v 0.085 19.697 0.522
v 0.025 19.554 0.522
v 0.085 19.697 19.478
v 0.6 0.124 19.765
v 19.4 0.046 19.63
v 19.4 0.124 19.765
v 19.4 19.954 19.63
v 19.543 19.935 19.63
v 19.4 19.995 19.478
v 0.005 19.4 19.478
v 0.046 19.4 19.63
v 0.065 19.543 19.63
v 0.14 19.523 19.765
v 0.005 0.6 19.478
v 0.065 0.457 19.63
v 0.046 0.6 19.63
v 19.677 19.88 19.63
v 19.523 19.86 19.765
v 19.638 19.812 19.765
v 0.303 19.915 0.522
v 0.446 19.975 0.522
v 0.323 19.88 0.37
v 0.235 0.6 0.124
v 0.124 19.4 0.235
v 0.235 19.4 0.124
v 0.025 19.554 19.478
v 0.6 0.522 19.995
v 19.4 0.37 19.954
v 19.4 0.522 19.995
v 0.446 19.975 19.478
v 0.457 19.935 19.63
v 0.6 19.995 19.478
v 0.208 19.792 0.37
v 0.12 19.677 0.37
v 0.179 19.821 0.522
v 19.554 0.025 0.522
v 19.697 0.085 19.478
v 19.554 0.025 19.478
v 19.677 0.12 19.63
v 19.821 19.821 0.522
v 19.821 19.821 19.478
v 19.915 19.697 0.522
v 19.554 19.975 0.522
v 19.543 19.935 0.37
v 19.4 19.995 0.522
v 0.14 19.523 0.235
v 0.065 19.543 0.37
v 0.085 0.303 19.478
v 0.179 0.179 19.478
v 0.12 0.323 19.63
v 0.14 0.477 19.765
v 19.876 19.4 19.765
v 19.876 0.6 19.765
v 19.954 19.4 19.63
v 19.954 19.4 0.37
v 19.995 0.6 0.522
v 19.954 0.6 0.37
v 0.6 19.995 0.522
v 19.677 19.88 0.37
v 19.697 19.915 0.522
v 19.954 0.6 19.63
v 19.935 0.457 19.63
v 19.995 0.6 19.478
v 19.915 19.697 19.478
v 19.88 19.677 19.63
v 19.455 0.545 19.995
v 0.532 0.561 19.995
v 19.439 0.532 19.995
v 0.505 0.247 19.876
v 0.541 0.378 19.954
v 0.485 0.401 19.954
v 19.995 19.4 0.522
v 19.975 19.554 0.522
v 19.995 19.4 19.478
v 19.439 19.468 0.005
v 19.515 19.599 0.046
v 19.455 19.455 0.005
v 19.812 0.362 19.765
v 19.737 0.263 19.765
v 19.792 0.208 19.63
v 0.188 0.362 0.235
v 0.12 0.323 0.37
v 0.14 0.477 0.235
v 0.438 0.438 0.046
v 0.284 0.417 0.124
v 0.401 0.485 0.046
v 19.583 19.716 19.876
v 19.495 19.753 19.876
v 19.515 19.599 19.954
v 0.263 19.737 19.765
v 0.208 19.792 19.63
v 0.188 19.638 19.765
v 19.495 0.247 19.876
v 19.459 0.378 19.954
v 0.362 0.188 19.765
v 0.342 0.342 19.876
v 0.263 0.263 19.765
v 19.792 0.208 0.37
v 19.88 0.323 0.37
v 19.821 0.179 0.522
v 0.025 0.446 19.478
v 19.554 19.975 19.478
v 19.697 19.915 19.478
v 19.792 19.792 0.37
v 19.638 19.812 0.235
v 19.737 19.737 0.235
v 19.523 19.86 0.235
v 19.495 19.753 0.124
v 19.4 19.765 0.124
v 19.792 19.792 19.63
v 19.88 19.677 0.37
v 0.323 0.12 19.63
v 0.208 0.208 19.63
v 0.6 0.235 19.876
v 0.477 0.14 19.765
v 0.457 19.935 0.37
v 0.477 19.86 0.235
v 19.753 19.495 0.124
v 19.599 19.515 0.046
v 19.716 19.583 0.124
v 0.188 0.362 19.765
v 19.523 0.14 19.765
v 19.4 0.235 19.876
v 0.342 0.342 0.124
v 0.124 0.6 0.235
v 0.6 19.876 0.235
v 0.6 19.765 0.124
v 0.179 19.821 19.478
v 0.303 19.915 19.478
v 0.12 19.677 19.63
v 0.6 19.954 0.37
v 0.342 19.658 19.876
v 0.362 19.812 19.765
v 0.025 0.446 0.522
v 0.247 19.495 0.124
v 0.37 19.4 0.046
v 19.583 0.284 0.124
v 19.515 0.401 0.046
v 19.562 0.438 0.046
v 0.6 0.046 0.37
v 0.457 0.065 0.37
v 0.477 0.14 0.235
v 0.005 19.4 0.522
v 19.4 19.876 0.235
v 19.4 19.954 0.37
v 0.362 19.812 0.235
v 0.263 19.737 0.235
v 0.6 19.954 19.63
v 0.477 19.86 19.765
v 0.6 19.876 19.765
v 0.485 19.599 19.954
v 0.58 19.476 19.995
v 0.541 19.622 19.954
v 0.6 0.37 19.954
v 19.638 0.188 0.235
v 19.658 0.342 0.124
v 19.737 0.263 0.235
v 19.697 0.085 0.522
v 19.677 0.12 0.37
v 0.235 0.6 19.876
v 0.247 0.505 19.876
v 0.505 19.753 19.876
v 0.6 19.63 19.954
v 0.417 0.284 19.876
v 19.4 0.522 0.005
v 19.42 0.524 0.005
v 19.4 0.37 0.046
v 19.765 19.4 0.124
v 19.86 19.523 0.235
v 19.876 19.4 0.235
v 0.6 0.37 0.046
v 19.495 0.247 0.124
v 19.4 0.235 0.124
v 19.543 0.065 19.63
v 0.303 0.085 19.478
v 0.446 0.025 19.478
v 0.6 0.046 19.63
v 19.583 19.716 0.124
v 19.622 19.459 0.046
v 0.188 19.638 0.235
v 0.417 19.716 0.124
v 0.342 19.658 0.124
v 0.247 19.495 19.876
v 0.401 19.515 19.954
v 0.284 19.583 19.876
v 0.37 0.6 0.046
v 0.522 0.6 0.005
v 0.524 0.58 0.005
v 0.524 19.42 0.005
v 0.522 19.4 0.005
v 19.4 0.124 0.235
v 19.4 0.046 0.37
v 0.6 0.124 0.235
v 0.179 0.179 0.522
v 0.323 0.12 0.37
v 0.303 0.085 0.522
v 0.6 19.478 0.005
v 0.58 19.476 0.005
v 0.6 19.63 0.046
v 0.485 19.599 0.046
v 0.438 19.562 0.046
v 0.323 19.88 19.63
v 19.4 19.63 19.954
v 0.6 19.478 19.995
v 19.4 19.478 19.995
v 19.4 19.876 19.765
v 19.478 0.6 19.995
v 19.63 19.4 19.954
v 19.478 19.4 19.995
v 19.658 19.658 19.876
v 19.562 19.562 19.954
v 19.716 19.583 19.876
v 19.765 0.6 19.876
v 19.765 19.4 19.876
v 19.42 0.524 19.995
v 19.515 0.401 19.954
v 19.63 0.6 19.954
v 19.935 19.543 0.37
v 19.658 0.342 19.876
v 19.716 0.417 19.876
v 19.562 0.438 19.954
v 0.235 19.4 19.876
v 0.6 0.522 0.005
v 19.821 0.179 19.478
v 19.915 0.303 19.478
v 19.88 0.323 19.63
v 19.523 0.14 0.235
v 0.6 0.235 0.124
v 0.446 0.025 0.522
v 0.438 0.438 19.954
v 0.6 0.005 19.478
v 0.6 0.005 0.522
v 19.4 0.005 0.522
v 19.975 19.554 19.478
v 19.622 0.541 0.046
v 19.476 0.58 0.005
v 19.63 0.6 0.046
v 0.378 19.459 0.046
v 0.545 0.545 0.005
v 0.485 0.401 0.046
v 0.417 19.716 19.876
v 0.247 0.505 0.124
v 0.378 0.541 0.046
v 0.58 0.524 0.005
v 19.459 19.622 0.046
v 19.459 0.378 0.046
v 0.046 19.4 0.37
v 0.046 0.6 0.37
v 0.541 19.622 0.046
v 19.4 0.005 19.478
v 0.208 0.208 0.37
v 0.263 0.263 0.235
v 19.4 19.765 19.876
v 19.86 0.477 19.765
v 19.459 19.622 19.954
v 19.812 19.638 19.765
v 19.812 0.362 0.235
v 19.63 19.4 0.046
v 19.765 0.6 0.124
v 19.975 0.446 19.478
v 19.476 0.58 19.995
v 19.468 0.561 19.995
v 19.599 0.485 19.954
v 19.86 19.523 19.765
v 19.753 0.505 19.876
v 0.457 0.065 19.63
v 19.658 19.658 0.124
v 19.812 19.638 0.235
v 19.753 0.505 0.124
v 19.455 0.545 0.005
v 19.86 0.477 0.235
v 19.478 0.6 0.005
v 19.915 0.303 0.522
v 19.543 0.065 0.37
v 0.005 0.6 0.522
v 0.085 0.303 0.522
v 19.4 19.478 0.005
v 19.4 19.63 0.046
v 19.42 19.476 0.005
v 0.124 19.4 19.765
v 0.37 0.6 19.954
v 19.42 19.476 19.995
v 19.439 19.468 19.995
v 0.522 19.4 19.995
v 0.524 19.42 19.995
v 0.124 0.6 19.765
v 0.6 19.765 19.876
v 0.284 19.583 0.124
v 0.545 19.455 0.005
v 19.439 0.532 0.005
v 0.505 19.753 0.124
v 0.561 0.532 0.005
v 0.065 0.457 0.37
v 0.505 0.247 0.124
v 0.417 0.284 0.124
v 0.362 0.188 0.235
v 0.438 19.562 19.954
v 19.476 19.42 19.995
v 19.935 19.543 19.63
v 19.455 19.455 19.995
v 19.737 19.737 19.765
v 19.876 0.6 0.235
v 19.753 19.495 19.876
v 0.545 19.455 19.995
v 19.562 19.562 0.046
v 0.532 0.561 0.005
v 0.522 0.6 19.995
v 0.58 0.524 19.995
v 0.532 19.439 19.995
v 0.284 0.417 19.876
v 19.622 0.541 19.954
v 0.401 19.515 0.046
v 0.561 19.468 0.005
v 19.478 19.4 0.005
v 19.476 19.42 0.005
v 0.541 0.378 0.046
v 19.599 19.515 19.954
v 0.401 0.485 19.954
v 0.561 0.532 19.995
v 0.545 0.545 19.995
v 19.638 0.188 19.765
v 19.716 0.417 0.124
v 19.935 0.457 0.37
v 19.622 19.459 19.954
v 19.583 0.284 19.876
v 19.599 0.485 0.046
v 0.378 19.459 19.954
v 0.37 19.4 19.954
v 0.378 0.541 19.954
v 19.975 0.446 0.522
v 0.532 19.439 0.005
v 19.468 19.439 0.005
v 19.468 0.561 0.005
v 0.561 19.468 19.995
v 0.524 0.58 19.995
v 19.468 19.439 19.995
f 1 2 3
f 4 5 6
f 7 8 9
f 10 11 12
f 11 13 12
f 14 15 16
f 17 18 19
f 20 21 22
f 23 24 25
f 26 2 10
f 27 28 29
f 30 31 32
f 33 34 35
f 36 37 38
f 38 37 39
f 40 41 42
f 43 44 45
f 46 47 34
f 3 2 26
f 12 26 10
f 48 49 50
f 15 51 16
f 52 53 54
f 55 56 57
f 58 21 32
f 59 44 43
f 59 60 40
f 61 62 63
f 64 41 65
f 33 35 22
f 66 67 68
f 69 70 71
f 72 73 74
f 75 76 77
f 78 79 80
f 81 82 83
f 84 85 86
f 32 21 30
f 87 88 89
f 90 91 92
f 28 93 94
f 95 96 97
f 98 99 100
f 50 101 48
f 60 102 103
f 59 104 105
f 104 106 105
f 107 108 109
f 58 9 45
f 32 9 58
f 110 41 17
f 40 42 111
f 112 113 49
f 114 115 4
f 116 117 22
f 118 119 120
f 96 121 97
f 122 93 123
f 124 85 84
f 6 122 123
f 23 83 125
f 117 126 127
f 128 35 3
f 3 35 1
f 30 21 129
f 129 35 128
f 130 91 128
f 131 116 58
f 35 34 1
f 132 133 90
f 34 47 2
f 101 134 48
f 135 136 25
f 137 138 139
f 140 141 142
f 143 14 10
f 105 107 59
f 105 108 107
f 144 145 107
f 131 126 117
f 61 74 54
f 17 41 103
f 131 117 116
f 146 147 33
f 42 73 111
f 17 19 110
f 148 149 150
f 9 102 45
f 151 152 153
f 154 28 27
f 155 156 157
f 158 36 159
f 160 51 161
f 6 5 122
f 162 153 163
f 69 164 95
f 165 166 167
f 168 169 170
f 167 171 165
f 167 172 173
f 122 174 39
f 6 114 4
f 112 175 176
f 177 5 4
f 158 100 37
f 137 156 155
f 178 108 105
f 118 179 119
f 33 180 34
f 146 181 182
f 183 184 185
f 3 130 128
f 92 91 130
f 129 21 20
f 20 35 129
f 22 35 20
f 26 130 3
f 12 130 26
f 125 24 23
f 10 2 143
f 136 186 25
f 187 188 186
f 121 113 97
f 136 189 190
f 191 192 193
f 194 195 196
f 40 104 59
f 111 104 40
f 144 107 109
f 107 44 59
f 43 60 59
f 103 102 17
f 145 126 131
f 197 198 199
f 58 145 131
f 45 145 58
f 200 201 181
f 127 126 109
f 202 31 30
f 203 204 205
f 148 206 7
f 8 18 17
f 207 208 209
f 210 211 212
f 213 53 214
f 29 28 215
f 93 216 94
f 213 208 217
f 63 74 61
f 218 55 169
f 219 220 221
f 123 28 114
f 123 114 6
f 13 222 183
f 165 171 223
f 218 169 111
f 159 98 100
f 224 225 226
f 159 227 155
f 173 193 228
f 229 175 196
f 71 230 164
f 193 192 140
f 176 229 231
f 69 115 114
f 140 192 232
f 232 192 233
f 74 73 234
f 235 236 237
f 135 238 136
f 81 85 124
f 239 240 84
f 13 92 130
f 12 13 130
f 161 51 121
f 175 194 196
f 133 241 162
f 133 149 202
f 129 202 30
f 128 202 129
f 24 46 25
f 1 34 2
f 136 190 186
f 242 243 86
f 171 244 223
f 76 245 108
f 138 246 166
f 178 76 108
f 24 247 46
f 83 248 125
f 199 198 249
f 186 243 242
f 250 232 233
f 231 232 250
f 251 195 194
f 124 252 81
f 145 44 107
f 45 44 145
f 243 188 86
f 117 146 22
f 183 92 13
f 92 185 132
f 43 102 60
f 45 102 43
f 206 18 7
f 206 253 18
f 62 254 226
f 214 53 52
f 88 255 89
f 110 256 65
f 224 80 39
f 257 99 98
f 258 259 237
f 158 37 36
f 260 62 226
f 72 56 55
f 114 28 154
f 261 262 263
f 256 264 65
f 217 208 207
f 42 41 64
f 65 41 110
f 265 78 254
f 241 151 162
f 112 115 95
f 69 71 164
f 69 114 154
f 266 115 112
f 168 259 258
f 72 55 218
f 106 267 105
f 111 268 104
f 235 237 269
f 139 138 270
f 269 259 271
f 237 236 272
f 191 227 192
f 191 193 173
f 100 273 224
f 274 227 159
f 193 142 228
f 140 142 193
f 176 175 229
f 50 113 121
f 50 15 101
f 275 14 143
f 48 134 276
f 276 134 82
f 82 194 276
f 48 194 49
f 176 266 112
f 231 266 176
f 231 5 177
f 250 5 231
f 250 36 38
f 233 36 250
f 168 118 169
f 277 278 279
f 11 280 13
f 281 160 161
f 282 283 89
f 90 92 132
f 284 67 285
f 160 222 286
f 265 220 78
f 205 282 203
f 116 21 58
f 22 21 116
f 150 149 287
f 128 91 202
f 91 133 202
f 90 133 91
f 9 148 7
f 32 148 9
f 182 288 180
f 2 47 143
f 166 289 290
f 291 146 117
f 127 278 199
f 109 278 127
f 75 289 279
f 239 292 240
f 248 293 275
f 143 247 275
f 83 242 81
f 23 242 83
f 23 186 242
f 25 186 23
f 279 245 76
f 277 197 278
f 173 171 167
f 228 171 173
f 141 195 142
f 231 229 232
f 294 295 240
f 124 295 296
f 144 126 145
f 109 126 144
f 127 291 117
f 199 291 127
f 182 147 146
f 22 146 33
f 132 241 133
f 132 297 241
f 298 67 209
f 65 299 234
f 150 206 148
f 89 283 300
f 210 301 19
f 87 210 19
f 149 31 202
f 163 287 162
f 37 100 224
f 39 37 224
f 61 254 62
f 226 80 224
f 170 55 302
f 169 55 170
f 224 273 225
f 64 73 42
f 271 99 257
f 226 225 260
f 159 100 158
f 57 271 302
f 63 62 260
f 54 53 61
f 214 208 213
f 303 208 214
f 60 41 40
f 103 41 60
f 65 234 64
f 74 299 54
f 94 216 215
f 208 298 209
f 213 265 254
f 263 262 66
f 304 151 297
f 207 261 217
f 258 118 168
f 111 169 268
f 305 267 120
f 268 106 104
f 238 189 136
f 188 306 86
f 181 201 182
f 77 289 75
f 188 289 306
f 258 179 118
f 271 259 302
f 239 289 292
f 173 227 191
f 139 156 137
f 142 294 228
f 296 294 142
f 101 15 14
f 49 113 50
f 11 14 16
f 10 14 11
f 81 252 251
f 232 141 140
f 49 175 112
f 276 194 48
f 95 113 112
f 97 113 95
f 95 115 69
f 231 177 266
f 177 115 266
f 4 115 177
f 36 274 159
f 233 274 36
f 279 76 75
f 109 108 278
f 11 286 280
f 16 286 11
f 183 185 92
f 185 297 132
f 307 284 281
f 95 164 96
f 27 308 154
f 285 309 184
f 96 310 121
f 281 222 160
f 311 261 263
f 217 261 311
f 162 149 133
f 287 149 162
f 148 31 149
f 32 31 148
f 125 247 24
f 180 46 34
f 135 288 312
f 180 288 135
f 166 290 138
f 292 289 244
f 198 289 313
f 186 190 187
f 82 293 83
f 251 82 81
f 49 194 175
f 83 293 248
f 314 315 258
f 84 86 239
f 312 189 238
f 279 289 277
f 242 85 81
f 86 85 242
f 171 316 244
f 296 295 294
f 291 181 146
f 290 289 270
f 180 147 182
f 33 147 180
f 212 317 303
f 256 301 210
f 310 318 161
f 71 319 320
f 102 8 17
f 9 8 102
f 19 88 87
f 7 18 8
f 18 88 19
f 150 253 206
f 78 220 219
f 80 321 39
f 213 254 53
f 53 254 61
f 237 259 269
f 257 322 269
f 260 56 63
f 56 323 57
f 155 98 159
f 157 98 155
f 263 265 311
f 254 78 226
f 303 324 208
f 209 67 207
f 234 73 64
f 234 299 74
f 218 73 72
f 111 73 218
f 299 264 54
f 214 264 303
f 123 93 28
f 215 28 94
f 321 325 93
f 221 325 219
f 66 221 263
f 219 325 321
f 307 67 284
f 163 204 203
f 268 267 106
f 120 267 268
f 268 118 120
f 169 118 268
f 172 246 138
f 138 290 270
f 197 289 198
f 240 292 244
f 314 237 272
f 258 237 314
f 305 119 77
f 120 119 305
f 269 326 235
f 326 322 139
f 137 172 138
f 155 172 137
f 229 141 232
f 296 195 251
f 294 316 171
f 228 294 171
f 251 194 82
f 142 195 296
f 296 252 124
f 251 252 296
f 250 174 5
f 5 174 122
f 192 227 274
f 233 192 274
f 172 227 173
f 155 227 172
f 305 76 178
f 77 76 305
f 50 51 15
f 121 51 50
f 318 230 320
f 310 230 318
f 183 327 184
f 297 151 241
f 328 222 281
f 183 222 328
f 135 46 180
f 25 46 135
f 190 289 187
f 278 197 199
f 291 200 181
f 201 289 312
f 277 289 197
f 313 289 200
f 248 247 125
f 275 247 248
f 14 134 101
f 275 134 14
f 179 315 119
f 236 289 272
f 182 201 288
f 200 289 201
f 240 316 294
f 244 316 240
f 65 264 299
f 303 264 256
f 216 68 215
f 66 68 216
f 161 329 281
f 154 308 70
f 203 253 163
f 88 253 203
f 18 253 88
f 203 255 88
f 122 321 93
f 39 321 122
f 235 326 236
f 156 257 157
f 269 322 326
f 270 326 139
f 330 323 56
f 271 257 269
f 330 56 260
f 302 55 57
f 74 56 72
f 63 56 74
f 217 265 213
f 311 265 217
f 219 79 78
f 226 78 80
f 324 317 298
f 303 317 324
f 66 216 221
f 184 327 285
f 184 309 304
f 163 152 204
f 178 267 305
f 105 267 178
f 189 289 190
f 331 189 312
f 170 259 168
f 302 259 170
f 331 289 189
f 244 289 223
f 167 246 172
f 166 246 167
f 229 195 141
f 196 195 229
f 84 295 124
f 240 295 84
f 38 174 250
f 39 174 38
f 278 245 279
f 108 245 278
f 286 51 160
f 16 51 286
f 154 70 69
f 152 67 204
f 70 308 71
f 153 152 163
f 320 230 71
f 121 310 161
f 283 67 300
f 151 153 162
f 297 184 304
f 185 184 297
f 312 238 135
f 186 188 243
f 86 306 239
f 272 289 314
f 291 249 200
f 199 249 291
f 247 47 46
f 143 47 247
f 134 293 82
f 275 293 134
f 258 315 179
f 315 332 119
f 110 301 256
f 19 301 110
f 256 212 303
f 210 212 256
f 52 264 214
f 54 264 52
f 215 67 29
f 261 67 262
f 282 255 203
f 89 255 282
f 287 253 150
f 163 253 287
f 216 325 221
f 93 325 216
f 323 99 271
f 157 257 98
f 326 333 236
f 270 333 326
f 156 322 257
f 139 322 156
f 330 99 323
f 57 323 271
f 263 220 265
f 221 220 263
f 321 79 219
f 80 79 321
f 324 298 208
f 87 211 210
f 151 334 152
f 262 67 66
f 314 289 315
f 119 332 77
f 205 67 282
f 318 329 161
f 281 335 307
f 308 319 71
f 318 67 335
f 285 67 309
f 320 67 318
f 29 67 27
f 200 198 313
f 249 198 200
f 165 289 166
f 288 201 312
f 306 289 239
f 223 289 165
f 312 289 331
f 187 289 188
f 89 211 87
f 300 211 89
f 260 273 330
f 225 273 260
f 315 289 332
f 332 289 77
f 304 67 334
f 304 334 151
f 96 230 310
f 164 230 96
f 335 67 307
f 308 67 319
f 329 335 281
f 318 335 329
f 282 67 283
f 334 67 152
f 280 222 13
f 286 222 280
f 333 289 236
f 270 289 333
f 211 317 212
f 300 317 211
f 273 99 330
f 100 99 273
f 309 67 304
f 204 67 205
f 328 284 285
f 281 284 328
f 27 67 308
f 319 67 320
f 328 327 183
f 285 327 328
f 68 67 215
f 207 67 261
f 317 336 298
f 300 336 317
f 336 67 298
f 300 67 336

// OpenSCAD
// Printwright demo catalog — self-authored parametric models, dedicated CC0-1.0.
// Generate with: scripts/generate_seed_assets.sh

$fn = 64;
model = "calibration-cube";

module rounded_box(size, radius) {
  translate([radius, radius, radius])
    minkowski() {
      cube([size[0] - 2 * radius, size[1] - 2 * radius, size[2] - 2 * radius]);
      sphere(r = radius, $fn = 24);
    }
}

module phone_stand() {
  // Flat base, two triangulated back ribs, and a retaining lip.
  union() {
    cube([76, 66, 4]);
    translate([0, 5, 4]) cube([76, 6, 13]);
    for (x = [8, 62])
      hull() {
        translate([x, 43, 4]) cube([6, 14, 3]);
        translate([x, 48, 4]) rotate([0, 0, 0]) cube([6, 5, 54]);
      }
    translate([8, 48, 4]) cube([60, 5, 8]);
  }
}

module cable_clip() {
  // Springy open ring on a broad adhesive/screw-free desk pad.
  linear_extrude(height = 12)
    union() {
      translate([-14, -10]) square([28, 7]);
      difference() {
        circle(r = 13);
        circle(r = 8);
        translate([-3.8, 3]) square([7.6, 14]);
      }
    }
}

module planter() {
  difference() {
    cylinder(h = 64, r1 = 33, r2 = 27, $fn = 72);
    translate([0, 0, 3]) cylinder(h = 64, r1 = 29, r2 = 23, $fn = 72);
    translate([0, 0, -1]) cylinder(h = 6, r = 3.2, $fn = 28);
  }
}

module pip(x, y, z, face) {
  if (face == "top") translate([x, y, z]) sphere(r = 2.25, $fn = 20);
  if (face == "front") translate([x, y, z]) sphere(r = 2.25, $fn = 20);
  if (face == "right") translate([x, y, z]) sphere(r = 2.25, $fn = 20);
}

module dice() {
  // Rounded 24 mm die with 1/2/3 recessed faces visible from the print orientation.
  difference() {
    rounded_box([24, 24, 24], 1.7);
    pip(12, 12, 23.4, "top");
    for (x = [7, 17]) pip(x, -0.4, 12, "front");
    for (p = [[23.4, 7, 7], [23.4, 12, 12], [23.4, 17, 17]])
      pip(p[0], p[1], p[2], "right");
  }
}

module bag_hook() {
  // Open, flat carabiner-style hook; the tapered mouth flexes in PETG.
  linear_extrude(height = 8)
    difference() {
      union() {
        difference() {
          circle(r = 26, $fn = 96);
          circle(r = 18, $fn = 96);
        }
        translate([-26, -5]) square([18, 10]);
      }
      translate([8, 5]) rotate(30) square([28, 10]);
    }
}

module vase() {
  // Twisted twelve-sided shell, with a closed 2.4 mm floor.
  difference() {
    linear_extrude(height = 105, twist = 105, slices = 105, scale = 0.72)
      circle(r = 29, $fn = 12);
    translate([0, 0, 2.4])
      linear_extrude(height = 104, twist = 105, slices = 105, scale = 0.72)
        circle(r = 26.2, $fn = 12);
  }
}

module gear() {
  teeth = 14;
  tooth_points = [
    for (i = [0 : teeth * 4 - 1])
      let(a = i * 360 / (teeth * 4), r = (i % 4 == 1 || i % 4 == 2) ? 25 : 21)
        [r * cos(a), r * sin(a)]
  ];
  linear_extrude(height = 9)
    difference() {
      polygon(tooth_points);
      circle(r = 5.2, $fn = 32);
      for (a = [0 : 60 : 300]) translate([13 * cos(a), 13 * sin(a)]) circle(r = 3.1, $fn = 24);
    }
}

module wall_bracket() {
  // One-piece L bracket with two wall holes and a gusset on each side.
  difference() {
    union() {
      cube([52, 6, 58]);
      cube([52, 48, 6]);
      for (x = [3, 43])
        translate([x, 6, 6]) rotate([90, 0, 90])
          linear_extrude(height = 6) polygon([[0, 0], [35, 0], [0, 42]]);
    }
    for (x = [15, 37])
      translate([x, -1, 39]) rotate([-90, 0, 0]) cylinder(h = 8, r = 3.3, $fn = 30);
  }
}

module whistle() {
  // Pealess signal-whistle prototype: mouth airway feeds a resonant chamber and edge.
  difference() {
    union() {
      hull() {
        translate([0, 0, 10]) rotate([90, 0, 0]) cylinder(h = 18, r = 10, center = true);
        translate([38, 0, 10]) cube([22, 18, 20], center = true);
      }
      translate([-10, 0, 10]) rotate([90, 0, 0]) cylinder(h = 18, r = 5, center = true);
    }
    // Resonant chamber and sound window.
    translate([-1, 0, 11]) rotate([90, 0, 0]) cylinder(h = 12, r = 6.3, center = true);
    translate([4, -7, 11]) cube([18, 14, 11]);
    // Straight mouth airway, ending at a sharp ramp.
    translate([18, -6, 11.5]) cube([32, 12, 4]);
    translate([8, -7, 10]) rotate([0, -20, 0]) cube([14, 14, 5]);
    // Lanyard hole.
    translate([-10, 0, 10]) rotate([90, 0, 0]) cylinder(h = 22, r = 2.3, center = true, $fn = 24);
  }
}

module beaver() {
  // Single-piece desk mascot: body, head, tail, feet, ears, muzzle, eyes and hat.
  union() {
    translate([0, 0, 21]) scale([1.05, 0.78, 1.2]) sphere(r = 17, $fn = 48);
    translate([0, 0, 49]) scale([1, 0.86, 0.9]) sphere(r = 15, $fn = 48);
    translate([0, 14, 43]) scale([1, 0.45, 0.58]) sphere(r = 9, $fn = 36);
    for (x = [-6, 6]) translate([x, 12, 51]) sphere(r = 1.8, $fn = 20);
    for (x = [-11, 11]) translate([x, 0, 59]) sphere(r = 4, $fn = 28);
    for (x = [-10, 10]) translate([x, 5, 3.6]) scale([1.4, 1.8, 0.6]) sphere(r = 6, $fn = 32);
    translate([0, -18, 4]) scale([0.72, 1.3, 0.18]) sphere(r = 15, $fn = 40);
    translate([0, 0, 62]) cylinder(h = 3, r = 13, $fn = 48);
    translate([0, 0, 64]) cylinder(h = 12, r = 8.5, $fn = 48);
  }
}

module calibration_cube() {
  // Exact nominal envelope, chamfered only 0.6 mm to reduce elephant-foot ambiguity.
  rounded_box([20, 20, 20], 0.6);
}

module hex_organizer() {
  // Open hex cup with a 3 mm floor and 2.6 mm walls.
  difference() {
    cylinder(h = 72, r = 34, $fn = 6);
    translate([0, 0, 3]) cylinder(h = 72, r = 28.8, $fn = 6);
  }
}

color("#e26d5a") {
  if (model == "phone-stand") rotate([0, 0, 180]) phone_stand();
  else if (model == "cable-clip") cable_clip();
  else if (model == "planter-mini") planter();
  else if (model == "dice-d6") dice();
  else if (model == "bag-hook") bag_hook();
  else if (model == "vase-spiral") vase();
  else if (model == "gear-toy") gear();
  else if (model == "wall-bracket") wall_bracket();
  else if (model == "whistle") whistle();
  else if (model == "beaver-with-hat") rotate([0, 0, 180]) beaver();
  else if (model == "calibration-cube") calibration_cube();
  else if (model == "hex-organizer") hex_organizer();
}
